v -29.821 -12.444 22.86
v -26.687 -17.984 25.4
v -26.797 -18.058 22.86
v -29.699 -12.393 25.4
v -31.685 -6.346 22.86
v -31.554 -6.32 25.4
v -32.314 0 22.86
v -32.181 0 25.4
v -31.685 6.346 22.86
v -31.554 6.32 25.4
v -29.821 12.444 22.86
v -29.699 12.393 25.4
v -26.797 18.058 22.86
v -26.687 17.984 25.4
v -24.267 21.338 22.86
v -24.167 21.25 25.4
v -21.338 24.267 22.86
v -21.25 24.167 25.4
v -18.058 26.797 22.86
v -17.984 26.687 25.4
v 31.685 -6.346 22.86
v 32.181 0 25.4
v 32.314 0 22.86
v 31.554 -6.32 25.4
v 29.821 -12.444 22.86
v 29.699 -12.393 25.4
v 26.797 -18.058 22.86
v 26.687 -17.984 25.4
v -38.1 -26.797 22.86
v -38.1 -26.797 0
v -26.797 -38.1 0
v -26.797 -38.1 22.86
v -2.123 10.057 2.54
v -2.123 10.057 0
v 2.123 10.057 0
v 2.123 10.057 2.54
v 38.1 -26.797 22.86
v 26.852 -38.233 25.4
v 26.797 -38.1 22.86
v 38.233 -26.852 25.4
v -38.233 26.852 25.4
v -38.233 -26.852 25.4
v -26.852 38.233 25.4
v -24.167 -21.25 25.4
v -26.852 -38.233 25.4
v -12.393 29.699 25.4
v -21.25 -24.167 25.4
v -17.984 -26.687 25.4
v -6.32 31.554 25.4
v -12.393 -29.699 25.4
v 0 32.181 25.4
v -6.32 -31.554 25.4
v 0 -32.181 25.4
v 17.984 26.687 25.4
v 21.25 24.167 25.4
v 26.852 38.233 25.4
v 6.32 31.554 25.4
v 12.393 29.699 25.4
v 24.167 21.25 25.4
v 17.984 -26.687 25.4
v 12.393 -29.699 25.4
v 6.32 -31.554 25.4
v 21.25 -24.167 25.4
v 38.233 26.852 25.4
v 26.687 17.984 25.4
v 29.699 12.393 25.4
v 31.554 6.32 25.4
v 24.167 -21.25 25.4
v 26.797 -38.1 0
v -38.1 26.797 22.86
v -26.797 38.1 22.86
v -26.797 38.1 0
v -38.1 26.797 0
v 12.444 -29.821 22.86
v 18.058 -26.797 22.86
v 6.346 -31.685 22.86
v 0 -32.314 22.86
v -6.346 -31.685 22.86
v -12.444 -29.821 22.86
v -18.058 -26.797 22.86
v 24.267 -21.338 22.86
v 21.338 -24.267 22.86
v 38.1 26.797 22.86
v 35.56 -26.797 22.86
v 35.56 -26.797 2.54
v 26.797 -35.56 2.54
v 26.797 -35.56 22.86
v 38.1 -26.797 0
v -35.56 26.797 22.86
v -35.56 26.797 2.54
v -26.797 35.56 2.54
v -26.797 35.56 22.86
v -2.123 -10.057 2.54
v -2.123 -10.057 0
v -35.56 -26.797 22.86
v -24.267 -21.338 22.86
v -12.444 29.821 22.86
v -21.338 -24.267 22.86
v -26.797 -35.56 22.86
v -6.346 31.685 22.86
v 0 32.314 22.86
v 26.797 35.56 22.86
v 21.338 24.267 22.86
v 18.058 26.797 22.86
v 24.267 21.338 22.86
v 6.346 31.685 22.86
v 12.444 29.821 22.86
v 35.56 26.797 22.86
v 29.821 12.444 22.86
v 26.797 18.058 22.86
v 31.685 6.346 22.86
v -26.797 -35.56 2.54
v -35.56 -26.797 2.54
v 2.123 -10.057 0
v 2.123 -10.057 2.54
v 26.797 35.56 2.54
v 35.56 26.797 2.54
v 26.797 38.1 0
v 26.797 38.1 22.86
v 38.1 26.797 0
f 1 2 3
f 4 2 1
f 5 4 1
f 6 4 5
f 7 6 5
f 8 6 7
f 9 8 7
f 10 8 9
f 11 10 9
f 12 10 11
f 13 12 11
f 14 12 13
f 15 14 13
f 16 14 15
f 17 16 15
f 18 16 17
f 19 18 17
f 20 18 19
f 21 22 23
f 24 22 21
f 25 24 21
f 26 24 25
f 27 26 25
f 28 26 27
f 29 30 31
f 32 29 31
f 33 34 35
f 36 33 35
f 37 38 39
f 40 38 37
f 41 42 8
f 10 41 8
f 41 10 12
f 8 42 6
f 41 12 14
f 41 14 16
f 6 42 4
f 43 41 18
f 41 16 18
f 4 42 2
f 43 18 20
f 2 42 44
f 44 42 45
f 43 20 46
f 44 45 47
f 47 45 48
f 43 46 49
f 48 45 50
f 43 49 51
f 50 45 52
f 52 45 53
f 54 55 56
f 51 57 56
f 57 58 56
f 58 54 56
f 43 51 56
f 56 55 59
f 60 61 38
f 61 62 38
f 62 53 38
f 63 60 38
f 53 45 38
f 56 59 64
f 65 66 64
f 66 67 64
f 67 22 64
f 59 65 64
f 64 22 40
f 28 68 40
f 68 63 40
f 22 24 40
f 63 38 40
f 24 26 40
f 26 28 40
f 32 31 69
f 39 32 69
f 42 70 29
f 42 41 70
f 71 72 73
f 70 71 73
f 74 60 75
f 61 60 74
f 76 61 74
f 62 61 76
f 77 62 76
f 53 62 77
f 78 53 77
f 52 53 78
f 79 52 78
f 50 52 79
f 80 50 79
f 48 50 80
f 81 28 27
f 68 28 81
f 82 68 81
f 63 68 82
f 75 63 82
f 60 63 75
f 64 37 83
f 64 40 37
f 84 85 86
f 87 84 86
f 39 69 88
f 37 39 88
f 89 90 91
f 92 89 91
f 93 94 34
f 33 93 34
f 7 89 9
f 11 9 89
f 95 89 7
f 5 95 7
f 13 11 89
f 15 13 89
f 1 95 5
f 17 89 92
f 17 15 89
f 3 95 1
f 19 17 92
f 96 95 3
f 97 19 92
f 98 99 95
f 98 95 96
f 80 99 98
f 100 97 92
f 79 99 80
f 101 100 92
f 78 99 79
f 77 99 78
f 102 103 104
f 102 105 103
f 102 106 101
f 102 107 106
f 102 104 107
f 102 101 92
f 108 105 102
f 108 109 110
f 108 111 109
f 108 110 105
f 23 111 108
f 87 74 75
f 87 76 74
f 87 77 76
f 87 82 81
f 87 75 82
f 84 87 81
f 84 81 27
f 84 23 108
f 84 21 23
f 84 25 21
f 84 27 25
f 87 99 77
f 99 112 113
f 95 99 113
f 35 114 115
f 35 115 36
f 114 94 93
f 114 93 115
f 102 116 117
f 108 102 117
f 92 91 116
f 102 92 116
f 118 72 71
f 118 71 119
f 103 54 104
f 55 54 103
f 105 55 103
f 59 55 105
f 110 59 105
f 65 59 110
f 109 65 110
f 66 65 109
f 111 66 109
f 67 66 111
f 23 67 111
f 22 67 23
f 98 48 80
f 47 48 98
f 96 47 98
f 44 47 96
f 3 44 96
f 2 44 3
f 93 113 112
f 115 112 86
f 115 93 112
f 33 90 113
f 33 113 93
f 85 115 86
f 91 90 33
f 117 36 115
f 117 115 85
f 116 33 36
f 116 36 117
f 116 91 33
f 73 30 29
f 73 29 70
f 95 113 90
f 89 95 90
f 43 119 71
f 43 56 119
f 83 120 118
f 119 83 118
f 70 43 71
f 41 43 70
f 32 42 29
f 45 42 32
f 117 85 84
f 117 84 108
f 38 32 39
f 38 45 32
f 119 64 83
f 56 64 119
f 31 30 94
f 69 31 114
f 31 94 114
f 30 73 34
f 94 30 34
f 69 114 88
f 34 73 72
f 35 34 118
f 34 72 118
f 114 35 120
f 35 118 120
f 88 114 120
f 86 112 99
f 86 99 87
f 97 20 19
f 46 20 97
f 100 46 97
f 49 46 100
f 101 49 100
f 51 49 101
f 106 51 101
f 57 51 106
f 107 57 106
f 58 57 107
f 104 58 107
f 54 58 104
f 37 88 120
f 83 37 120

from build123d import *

# Parameters (mm, degrees)
F3_DEPTH = 2.54
F3_TAPER = -3
F0_W     = 2.54
F0_H     = 53.594
F0_W_2   = 53.594
F0_H_2   = 2.54
F4_DEPTH = 25.4
F0_H_3   = 8.763
F0_W_3   = 8.763
F2_W     = 53.594
F2_H     = 53.594
F2_W_2   = 4.2453631759
F2_H_2   = 20.1131701469
F6_DEPTH = 2.54


with BuildPart() as f3:
    # F5 (on offset) → F3 (new body)
    with BuildSketch(Plane.XY.offset(22.86)):
        Polygon((-26.797, -26.797), (-38.1, -26.797), (-26.797, -38.1), align=None)
        with BuildLine():
            ThreePointArc((-18.0581535106, -26.797), (-22.8492463466, -22.8492463466), (-26.797, -18.0581535106))
            Line((-26.797, -18.0581535106), (-26.797, -26.797))
            Line((-26.797, -26.797), (-18.0581535106, -26.797))
        make_face()
        Polygon((38.1, 26.797), (26.797, 38.1), (26.797, 26.797), align=None)
        with BuildLine():
            Line((26.797, 18.0581535106), (26.797, 26.797))
            Line((26.797, 26.797), (18.0581535106, 26.797))
            ThreePointArc((18.0581535106, 26.797), (22.8492463466, 22.8492463466), (26.797, 18.0581535106))
        make_face()
        with BuildLine():
            Line((-18.0581535106, 26.797), (-26.797, 26.797))
            Line((-26.797, 26.797), (-26.797, 18.0581535106))
            ThreePointArc((-26.797, 18.0581535106), (-22.8492463466, 22.8492463466), (-18.0581535106, 26.797))
        make_face()
        Polygon((26.797, -38.1), (38.1, -26.797), (26.797, -26.797), align=None)
        with BuildLine():
            Line((38.1, 26.797), (26.797, 26.797))
            Line((26.797, 26.797), (26.797, 18.0581535106))
            ThreePointArc((26.797, 18.0581535106), (30.9037757664, 9.4410148075), (32.3137140733, 0))
            ThreePointArc((32.3137140733, 0), (30.9037757664, -9.4410148075), (26.797, -18.0581535106))
            Line((26.797, -18.0581535106), (26.797, -26.797))
            Line((26.797, -26.797), (38.1, -26.797))
            Line((38.1, -26.797), (38.1, 26.797))
        make_face()
        with BuildLine():
            Line((26.797, -38.1), (26.797, -26.797))
            Line((26.797, -26.797), (18.0581535106, -26.797))
            ThreePointArc((18.0581535106, -26.797), (0, -32.3137140733), (-18.0581535106, -26.797))
            Line((-18.0581535106, -26.797), (-26.797, -26.797))
            Line((-26.797, -26.797), (-26.797, -38.1))
            Line((-26.797, -38.1), (26.797, -38.1))
        make_face()
        Polygon((-26.797, 26.797), (-26.797, 38.1), (-38.1, 26.797), align=None)
        with BuildLine():
            Line((26.797, 26.797), (26.797, 38.1))
            Line((26.797, 38.1), (-26.797, 38.1))
            Line((-26.797, 38.1), (-26.797, 26.797))
            Line((-26.797, 26.797), (-18.0581535106, 26.797))
            ThreePointArc((-18.0581535106, 26.797), (0, 32.3137140733), (18.0581535106, 26.797))
            Line((18.0581535106, 26.797), (26.797, 26.797))
        make_face()
        with BuildLine():
            Line((26.797, -26.797), (26.797, -18.0581535106))
            ThreePointArc((26.797, -18.0581535106), (22.8492463466, -22.8492463466), (18.0581535106, -26.797))
            Line((18.0581535106, -26.797), (26.797, -26.797))
        make_face()
        with BuildLine():
            Line((-26.797, 18.0581535106), (-26.797, 26.797))
            Line((-26.797, 26.797), (-38.1, 26.797))
            Line((-38.1, 26.797), (-38.1, -26.797))
            Line((-38.1, -26.797), (-26.797, -26.797))
            Line((-26.797, -26.797), (-26.797, -18.0581535106))
            ThreePointArc((-26.797, -18.0581535106), (-32.3137140733, 0), (-26.797, 18.0581535106))
        make_face()
    extrude(amount=F3_DEPTH, taper=F3_TAPER)

    # F0 (on Top) → F4 (join)
    with BuildSketch(Plane.XY):
        with Locations((36.83, 0)):
            Rectangle(F0_W, F0_H)
        Polygon((26.797, -38.1), (38.1, -26.797), (35.56, -26.797), (26.797, -35.56), align=None)
        with Locations((0, -36.83)):
            Rectangle(F0_W_2, F0_H_2)
        Polygon((-35.56, -26.797), (-38.1, -26.797), (-26.797, -38.1), (-26.797, -35.56), align=None)
        with Locations((-36.83, 0)):
            Rectangle(F0_W, F0_H)
        Polygon((-26.797, 35.56), (-26.797, 38.1), (-38.1, 26.797), (-35.56, 26.797), align=None)
        with Locations((0, 36.83)):
            Rectangle(F0_W_2, F0_H_2)
        Polygon((38.1, 26.797), (26.797, 38.1), (26.797, 35.56), (35.56, 26.797), align=None)
    extrude(amount=F4_DEPTH)

    # F0 (on Top) + F2 (on face) → F6 (join)
    with BuildSketch(Plane.XY):
        Polygon((35.56, 26.797), (26.797, 35.56), (26.797, 26.797), align=None)
        with Locations((0, 31.1785)):
            Rectangle(F0_W_2, F0_H_3)
        with Locations((31.1785, 0)):
            Rectangle(F0_W_3, F0_H)
        Polygon((-26.797, 26.797), (-26.797, 35.56), (-35.56, 26.797), align=None)
        with Locations((-31.1785, 0)):
            Rectangle(F0_W_3, F0_H)
        Polygon((-26.797, -35.56), (-26.797, -26.797), (-35.56, -26.797), align=None)
        with Locations((0, -31.1785)):
            Rectangle(F0_W_2, F0_H_3)
        Polygon((35.56, -26.797), (26.797, -26.797), (26.797, -35.56), align=None)
    with BuildSketch(Plane.XY):
        Rectangle(F2_W, F2_H)
        Rectangle(F2_W_2, F2_H_2, mode=Mode.SUBTRACT)
    extrude(amount=F6_DEPTH)


solid = f3.part
